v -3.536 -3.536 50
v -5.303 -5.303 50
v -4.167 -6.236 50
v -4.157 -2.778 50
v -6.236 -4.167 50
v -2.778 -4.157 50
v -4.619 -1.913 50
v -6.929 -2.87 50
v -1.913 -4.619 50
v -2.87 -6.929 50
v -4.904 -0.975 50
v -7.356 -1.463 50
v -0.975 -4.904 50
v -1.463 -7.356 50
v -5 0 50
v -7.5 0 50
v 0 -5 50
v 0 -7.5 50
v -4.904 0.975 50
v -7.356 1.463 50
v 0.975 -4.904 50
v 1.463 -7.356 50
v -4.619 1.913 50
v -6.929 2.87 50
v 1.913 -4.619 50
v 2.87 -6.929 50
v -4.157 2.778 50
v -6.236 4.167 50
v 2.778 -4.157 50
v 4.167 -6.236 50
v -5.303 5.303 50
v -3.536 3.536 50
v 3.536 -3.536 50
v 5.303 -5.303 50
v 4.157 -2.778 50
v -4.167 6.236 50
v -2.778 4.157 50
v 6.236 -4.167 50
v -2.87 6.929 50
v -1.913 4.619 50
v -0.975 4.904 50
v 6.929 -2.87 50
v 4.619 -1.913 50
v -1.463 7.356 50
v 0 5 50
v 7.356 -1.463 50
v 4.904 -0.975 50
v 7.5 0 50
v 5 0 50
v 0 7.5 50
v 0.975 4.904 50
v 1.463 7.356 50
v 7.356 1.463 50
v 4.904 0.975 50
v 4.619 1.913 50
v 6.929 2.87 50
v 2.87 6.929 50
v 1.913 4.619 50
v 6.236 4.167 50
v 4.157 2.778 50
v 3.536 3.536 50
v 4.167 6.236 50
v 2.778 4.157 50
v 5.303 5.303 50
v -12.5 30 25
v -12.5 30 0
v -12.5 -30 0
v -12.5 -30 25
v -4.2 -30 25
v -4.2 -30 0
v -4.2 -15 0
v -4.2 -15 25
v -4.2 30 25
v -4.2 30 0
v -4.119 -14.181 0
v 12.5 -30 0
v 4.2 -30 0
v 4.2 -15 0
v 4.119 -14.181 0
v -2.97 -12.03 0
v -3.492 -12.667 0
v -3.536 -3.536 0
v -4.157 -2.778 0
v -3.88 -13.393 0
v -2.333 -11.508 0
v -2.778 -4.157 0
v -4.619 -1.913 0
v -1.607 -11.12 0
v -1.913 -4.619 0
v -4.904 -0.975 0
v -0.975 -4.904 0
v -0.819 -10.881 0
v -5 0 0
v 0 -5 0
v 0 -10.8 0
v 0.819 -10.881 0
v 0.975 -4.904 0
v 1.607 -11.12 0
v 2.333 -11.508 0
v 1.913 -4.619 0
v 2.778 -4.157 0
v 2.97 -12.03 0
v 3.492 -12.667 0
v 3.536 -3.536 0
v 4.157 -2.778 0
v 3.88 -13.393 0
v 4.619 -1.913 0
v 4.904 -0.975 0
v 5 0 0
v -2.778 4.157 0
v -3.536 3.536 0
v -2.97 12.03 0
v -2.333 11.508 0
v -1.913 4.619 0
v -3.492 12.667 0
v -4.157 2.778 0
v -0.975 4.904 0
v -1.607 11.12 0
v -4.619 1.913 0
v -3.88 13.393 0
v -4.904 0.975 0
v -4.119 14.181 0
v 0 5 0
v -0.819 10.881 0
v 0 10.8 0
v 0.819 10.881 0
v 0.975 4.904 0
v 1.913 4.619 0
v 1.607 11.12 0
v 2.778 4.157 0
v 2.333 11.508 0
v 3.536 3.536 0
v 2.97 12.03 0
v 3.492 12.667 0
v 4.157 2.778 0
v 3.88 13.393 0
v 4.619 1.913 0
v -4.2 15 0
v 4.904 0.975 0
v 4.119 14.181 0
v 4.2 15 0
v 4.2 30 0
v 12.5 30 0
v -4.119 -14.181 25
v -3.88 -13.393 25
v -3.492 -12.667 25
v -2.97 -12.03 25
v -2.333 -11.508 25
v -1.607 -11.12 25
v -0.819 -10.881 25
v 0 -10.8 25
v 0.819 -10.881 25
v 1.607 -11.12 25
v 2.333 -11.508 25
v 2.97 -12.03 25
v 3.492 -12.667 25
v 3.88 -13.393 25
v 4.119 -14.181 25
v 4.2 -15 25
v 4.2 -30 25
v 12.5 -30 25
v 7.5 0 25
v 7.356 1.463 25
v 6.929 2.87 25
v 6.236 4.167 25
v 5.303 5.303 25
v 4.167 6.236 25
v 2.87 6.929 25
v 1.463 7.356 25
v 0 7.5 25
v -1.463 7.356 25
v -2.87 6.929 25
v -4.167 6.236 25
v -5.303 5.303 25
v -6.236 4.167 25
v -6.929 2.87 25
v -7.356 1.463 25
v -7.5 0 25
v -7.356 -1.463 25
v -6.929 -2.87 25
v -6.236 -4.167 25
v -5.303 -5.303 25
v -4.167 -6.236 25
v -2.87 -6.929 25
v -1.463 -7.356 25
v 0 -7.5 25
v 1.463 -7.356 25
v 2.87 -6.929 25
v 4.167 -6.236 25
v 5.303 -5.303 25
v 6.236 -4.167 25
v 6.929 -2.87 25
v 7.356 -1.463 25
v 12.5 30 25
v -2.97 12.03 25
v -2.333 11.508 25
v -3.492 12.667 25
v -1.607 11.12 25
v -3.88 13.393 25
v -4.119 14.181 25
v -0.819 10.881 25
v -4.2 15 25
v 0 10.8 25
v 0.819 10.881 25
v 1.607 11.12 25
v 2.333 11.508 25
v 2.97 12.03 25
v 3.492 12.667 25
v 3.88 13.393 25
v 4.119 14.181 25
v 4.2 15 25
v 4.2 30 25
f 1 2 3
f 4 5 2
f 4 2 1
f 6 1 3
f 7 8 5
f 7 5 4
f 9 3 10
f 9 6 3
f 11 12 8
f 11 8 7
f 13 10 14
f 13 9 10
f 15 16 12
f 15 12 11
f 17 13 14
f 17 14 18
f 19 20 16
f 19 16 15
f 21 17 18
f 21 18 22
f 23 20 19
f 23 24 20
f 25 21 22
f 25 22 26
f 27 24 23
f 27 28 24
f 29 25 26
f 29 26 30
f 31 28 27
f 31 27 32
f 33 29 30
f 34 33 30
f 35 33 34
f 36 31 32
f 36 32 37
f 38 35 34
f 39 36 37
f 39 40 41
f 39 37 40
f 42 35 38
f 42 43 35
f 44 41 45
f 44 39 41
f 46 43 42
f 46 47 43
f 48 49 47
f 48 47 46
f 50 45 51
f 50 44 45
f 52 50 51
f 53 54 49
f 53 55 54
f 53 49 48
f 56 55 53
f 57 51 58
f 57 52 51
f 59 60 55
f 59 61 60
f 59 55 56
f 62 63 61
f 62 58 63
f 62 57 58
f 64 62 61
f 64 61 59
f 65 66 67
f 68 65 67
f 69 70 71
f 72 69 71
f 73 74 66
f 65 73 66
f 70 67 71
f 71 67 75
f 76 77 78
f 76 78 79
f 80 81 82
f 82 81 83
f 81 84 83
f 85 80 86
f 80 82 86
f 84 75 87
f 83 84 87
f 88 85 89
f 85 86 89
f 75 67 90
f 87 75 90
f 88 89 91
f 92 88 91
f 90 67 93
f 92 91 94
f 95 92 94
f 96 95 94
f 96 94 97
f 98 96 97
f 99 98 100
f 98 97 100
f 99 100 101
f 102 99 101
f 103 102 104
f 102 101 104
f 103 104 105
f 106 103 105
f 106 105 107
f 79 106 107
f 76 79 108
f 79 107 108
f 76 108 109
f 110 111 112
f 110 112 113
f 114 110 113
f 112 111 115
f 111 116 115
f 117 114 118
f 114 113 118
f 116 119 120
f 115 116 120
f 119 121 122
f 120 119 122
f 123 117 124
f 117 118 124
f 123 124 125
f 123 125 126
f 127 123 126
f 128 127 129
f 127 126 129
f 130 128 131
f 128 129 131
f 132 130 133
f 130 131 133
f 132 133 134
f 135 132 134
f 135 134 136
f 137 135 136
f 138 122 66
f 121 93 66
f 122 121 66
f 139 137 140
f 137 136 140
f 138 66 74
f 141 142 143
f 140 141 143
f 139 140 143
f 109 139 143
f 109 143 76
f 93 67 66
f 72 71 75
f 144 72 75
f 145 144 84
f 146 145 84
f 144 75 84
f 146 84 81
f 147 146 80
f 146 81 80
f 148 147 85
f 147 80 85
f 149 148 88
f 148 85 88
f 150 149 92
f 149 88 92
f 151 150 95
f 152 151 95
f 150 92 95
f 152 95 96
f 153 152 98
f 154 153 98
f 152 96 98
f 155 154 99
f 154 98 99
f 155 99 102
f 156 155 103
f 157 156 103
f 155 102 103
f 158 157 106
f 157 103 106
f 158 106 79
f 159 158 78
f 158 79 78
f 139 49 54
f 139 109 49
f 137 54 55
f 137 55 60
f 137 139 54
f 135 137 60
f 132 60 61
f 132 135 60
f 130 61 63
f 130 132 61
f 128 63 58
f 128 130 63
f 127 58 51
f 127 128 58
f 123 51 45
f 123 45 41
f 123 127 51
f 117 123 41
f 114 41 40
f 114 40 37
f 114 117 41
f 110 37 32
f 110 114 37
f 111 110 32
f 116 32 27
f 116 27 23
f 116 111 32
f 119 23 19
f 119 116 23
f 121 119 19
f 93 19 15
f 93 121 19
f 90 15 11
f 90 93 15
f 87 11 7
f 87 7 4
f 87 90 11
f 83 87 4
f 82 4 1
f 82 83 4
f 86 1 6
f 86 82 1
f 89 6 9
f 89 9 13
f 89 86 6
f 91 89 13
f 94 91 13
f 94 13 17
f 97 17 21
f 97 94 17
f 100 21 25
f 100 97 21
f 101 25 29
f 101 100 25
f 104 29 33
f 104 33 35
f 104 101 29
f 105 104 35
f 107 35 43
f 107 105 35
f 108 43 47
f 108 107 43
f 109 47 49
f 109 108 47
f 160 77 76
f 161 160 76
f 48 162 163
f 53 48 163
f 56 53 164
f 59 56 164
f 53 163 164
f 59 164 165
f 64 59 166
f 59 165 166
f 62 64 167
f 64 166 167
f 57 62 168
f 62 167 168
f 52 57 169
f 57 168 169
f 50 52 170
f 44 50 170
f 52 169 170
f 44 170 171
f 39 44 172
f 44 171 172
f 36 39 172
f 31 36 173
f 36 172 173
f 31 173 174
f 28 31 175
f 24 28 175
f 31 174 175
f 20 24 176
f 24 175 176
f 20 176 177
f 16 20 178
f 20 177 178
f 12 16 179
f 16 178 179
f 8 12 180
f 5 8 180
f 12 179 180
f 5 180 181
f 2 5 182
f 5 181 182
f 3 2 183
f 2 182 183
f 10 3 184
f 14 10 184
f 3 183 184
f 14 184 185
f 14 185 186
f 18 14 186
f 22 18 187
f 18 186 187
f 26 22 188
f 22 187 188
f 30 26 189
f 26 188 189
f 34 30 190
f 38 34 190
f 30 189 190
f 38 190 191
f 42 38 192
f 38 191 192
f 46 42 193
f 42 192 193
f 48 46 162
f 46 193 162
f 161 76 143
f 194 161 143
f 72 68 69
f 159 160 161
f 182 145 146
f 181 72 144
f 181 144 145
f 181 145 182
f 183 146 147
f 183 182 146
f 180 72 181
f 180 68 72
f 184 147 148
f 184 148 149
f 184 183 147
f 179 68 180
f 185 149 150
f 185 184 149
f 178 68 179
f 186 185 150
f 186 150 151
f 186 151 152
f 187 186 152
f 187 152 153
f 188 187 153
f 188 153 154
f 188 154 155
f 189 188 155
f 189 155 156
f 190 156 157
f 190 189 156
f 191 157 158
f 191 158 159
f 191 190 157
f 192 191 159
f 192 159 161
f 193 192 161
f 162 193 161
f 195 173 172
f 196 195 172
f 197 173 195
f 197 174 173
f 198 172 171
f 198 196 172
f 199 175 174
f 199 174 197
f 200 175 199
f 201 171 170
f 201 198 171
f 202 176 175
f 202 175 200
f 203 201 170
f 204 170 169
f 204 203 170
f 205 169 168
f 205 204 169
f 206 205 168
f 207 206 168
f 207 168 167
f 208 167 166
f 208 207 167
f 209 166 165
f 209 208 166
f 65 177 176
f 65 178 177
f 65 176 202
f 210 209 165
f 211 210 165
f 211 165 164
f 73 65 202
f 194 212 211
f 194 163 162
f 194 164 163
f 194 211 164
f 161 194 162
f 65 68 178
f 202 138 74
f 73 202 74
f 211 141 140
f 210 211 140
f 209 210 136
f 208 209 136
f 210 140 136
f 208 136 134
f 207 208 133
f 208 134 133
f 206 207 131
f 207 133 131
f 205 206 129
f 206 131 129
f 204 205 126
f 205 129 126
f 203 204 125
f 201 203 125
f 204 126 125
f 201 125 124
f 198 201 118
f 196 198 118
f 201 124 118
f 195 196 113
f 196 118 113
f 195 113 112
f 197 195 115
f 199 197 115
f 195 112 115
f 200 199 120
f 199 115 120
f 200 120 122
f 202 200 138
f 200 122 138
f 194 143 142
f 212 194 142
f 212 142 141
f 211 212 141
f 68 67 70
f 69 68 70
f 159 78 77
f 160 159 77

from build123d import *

# Parameters (mm, degrees)
F0_R     = 5
F1_DEPTH = 25
F2_R     = 7.5
F2_R_2   = 5
F3_DEPTH = 25


with BuildPart() as f1:
    # F0 (on Top) → F1 (new body)
    with BuildSketch(Plane.XY):
        with BuildLine():
            Line((4.2, -30), (12.5, -30))
            Line((12.5, -30), (12.5, 30))
            Line((12.5, 30), (4.2, 30))
            Line((4.2, 30), (4.2, 15))
            ThreePointArc((4.2, 15), (0, 10.8), (-4.2, 15))
            Line((-4.2, 15), (-4.2, 30))
            Line((-4.2, 30), (-12.5, 30))
            Line((-12.5, 30), (-12.5, -30))
            Line((-12.5, -30), (-4.2, -30))
            Line((-4.2, -30), (-4.2, -15))
            ThreePointArc((-4.2, -15), (0, -10.8), (4.2, -15))
            Line((4.2, -15), (4.2, -30))
        make_face()
        Circle(F0_R, mode=Mode.SUBTRACT)
    extrude(amount=F1_DEPTH)

    # F2 (on face) → F3 (join)
    with BuildSketch(Plane.XY.offset(25)):
        Circle(F2_R)
        Circle(F2_R_2, mode=Mode.SUBTRACT)
    extrude(amount=F3_DEPTH)


solid = f1.part
